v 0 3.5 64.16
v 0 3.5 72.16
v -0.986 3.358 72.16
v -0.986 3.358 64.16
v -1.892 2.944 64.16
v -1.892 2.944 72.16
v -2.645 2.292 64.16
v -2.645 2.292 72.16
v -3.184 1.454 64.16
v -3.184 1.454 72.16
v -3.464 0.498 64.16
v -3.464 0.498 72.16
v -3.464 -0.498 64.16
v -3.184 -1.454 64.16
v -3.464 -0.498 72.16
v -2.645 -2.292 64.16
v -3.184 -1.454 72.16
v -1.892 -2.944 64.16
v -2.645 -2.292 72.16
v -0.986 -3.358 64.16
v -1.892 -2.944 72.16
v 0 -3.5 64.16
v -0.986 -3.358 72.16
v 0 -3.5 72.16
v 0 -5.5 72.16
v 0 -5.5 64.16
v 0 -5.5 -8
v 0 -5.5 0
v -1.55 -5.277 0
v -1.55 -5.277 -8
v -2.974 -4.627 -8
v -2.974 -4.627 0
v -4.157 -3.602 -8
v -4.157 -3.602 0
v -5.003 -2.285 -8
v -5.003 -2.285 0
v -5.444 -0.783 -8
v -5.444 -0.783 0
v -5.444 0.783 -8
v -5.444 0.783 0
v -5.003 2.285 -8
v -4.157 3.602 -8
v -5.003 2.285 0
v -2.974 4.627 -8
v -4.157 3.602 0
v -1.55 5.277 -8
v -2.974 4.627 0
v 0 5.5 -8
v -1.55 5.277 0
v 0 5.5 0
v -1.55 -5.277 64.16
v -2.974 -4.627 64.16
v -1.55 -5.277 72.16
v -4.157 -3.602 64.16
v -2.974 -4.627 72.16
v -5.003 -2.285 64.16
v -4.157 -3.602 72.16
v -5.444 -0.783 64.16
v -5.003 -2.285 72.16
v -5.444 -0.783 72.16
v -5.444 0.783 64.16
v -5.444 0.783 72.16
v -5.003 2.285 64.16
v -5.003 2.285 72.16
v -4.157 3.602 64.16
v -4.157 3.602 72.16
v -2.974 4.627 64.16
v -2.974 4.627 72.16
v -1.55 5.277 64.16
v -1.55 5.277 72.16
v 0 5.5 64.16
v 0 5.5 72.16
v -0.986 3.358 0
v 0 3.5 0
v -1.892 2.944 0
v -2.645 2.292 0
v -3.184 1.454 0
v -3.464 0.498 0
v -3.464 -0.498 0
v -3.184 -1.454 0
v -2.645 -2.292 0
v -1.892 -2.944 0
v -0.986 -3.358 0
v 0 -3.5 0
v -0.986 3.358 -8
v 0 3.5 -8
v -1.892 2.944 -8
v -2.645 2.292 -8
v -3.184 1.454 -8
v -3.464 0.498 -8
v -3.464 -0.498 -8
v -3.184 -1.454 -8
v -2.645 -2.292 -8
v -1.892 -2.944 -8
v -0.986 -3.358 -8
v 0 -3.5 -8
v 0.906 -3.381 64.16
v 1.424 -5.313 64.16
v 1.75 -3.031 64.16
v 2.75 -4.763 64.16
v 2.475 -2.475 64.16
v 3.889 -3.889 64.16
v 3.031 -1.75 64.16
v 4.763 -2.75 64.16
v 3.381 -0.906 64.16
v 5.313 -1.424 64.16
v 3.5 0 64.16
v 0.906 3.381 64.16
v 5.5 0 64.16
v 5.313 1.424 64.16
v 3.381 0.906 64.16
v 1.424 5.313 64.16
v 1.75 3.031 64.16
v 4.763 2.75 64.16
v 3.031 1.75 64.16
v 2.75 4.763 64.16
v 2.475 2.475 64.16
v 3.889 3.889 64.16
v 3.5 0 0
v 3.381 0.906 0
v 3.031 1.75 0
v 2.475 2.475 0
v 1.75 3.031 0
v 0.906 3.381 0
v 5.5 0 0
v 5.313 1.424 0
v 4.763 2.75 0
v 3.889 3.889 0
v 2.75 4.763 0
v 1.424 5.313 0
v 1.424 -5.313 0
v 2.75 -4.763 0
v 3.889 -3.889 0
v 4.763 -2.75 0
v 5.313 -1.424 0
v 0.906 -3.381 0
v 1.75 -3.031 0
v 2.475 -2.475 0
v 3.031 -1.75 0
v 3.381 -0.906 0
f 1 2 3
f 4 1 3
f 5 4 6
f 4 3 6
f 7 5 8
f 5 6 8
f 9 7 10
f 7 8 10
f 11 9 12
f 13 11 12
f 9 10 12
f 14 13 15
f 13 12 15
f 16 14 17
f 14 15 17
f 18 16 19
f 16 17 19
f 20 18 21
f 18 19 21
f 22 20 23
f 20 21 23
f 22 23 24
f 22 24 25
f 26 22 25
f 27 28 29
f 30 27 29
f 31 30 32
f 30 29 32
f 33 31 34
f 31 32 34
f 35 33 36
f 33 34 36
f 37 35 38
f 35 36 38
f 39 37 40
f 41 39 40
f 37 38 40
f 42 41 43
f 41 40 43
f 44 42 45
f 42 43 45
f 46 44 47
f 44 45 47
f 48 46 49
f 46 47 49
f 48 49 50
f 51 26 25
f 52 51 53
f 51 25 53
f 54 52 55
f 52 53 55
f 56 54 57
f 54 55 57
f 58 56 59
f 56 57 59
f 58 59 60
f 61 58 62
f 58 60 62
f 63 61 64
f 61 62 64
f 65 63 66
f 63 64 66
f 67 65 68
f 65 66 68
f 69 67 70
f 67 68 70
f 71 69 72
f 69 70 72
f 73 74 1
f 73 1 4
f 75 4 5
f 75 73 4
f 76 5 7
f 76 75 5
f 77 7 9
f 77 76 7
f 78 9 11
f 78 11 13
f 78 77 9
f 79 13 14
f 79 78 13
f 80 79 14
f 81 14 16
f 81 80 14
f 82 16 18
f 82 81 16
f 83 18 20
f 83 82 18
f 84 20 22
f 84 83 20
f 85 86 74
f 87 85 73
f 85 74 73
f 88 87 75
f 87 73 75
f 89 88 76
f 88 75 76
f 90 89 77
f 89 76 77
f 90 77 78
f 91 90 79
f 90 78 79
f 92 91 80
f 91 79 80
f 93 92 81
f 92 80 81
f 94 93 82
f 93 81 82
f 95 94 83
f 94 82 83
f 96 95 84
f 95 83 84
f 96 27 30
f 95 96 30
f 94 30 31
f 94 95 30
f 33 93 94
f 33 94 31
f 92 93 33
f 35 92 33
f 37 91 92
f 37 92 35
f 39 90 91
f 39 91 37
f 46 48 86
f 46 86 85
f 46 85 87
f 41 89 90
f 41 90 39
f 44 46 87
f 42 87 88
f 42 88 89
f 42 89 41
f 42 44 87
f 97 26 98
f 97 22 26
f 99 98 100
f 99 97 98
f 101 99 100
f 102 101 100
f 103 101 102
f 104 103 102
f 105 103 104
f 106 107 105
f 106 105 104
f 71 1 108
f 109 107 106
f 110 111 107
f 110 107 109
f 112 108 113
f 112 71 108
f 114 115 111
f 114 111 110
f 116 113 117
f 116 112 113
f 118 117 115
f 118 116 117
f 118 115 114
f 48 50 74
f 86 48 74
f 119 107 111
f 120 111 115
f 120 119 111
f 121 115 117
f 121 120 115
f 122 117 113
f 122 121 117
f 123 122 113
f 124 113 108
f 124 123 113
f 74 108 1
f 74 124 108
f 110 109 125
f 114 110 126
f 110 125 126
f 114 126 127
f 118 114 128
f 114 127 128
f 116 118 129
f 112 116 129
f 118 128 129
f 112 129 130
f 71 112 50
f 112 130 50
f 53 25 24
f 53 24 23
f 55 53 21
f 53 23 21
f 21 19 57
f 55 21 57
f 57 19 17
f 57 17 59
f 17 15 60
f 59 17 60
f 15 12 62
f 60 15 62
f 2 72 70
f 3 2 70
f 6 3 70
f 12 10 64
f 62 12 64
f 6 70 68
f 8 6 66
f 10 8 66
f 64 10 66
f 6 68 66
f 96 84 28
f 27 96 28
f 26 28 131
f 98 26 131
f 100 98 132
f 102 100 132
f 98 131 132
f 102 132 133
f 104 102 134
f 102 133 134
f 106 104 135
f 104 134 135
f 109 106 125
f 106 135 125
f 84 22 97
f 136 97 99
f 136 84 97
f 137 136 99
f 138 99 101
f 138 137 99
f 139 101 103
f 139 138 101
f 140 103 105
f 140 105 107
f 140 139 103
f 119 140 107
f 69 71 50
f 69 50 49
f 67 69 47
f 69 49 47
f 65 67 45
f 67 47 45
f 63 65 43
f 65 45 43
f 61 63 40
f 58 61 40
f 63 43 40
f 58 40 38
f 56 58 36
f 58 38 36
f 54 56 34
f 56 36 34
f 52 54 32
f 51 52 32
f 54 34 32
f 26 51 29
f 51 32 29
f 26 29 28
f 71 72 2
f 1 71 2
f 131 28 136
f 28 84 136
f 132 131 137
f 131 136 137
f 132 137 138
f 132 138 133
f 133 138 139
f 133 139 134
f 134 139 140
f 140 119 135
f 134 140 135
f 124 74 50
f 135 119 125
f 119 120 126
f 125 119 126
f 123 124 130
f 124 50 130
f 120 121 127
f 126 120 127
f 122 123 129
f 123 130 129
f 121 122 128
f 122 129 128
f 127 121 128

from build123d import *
from build123d.topology import SkipClean

# Parameters (mm, degrees)
SKETCH1_R                                        = 5.5
SKETCH1_R_2                                      = 3.5
BOSS_EXTRUDE1_DLUGOSC_CALKOWITA_DEPTH            = 64.16
BOSS_EXTRUDE2_PRZEDLUZENIE_DO_MONTAZU_DEPTH      = 8
BOSS_EXTRUDE2_PRZEDLUZENIE_DO_MONTAZU_DEPTH_BACK = 72.16


with BuildPart() as part:
    # Sketch1 → Boss-Extrude1 dlugosc calkowita (new body)
    with BuildSketch(Plane.XY):
        Circle(SKETCH1_R)
        Circle(SKETCH1_R_2, mode=Mode.SUBTRACT)
    extrude(amount=BOSS_EXTRUDE1_DLUGOSC_CALKOWITA_DEPTH)

    # Sketch2 → Boss-Extrude2 przedluzenie do montazu (add, two sides: drawn at the far end of the back side and taken through both)
    with SkipClean():  # the faces are left unmerged after this step: merging them gives an invalid solid
        with BuildSketch(Plane(origin=(0, 0, 0), x_dir=(-1, 0, 0), z_dir=(0, 0, -1)).offset(-BOSS_EXTRUDE2_PRZEDLUZENIE_DO_MONTAZU_DEPTH_BACK)):
            with BuildLine():
                Line((0, 5.5), (0, 3.5))
                ThreePointArc((0, 3.5), (3.5, 0), (0, -3.5))
                Line((0, -3.5), (0, -5.5))
                ThreePointArc((0, -5.5), (5.5, 0), (0, 5.5))
            make_face()
        extrude(amount=BOSS_EXTRUDE2_PRZEDLUZENIE_DO_MONTAZU_DEPTH + BOSS_EXTRUDE2_PRZEDLUZENIE_DO_MONTAZU_DEPTH_BACK)
    add(part.part.scale(1), mode=Mode.REPLACE)  # the faces are merged on a copy


solid = part.part
